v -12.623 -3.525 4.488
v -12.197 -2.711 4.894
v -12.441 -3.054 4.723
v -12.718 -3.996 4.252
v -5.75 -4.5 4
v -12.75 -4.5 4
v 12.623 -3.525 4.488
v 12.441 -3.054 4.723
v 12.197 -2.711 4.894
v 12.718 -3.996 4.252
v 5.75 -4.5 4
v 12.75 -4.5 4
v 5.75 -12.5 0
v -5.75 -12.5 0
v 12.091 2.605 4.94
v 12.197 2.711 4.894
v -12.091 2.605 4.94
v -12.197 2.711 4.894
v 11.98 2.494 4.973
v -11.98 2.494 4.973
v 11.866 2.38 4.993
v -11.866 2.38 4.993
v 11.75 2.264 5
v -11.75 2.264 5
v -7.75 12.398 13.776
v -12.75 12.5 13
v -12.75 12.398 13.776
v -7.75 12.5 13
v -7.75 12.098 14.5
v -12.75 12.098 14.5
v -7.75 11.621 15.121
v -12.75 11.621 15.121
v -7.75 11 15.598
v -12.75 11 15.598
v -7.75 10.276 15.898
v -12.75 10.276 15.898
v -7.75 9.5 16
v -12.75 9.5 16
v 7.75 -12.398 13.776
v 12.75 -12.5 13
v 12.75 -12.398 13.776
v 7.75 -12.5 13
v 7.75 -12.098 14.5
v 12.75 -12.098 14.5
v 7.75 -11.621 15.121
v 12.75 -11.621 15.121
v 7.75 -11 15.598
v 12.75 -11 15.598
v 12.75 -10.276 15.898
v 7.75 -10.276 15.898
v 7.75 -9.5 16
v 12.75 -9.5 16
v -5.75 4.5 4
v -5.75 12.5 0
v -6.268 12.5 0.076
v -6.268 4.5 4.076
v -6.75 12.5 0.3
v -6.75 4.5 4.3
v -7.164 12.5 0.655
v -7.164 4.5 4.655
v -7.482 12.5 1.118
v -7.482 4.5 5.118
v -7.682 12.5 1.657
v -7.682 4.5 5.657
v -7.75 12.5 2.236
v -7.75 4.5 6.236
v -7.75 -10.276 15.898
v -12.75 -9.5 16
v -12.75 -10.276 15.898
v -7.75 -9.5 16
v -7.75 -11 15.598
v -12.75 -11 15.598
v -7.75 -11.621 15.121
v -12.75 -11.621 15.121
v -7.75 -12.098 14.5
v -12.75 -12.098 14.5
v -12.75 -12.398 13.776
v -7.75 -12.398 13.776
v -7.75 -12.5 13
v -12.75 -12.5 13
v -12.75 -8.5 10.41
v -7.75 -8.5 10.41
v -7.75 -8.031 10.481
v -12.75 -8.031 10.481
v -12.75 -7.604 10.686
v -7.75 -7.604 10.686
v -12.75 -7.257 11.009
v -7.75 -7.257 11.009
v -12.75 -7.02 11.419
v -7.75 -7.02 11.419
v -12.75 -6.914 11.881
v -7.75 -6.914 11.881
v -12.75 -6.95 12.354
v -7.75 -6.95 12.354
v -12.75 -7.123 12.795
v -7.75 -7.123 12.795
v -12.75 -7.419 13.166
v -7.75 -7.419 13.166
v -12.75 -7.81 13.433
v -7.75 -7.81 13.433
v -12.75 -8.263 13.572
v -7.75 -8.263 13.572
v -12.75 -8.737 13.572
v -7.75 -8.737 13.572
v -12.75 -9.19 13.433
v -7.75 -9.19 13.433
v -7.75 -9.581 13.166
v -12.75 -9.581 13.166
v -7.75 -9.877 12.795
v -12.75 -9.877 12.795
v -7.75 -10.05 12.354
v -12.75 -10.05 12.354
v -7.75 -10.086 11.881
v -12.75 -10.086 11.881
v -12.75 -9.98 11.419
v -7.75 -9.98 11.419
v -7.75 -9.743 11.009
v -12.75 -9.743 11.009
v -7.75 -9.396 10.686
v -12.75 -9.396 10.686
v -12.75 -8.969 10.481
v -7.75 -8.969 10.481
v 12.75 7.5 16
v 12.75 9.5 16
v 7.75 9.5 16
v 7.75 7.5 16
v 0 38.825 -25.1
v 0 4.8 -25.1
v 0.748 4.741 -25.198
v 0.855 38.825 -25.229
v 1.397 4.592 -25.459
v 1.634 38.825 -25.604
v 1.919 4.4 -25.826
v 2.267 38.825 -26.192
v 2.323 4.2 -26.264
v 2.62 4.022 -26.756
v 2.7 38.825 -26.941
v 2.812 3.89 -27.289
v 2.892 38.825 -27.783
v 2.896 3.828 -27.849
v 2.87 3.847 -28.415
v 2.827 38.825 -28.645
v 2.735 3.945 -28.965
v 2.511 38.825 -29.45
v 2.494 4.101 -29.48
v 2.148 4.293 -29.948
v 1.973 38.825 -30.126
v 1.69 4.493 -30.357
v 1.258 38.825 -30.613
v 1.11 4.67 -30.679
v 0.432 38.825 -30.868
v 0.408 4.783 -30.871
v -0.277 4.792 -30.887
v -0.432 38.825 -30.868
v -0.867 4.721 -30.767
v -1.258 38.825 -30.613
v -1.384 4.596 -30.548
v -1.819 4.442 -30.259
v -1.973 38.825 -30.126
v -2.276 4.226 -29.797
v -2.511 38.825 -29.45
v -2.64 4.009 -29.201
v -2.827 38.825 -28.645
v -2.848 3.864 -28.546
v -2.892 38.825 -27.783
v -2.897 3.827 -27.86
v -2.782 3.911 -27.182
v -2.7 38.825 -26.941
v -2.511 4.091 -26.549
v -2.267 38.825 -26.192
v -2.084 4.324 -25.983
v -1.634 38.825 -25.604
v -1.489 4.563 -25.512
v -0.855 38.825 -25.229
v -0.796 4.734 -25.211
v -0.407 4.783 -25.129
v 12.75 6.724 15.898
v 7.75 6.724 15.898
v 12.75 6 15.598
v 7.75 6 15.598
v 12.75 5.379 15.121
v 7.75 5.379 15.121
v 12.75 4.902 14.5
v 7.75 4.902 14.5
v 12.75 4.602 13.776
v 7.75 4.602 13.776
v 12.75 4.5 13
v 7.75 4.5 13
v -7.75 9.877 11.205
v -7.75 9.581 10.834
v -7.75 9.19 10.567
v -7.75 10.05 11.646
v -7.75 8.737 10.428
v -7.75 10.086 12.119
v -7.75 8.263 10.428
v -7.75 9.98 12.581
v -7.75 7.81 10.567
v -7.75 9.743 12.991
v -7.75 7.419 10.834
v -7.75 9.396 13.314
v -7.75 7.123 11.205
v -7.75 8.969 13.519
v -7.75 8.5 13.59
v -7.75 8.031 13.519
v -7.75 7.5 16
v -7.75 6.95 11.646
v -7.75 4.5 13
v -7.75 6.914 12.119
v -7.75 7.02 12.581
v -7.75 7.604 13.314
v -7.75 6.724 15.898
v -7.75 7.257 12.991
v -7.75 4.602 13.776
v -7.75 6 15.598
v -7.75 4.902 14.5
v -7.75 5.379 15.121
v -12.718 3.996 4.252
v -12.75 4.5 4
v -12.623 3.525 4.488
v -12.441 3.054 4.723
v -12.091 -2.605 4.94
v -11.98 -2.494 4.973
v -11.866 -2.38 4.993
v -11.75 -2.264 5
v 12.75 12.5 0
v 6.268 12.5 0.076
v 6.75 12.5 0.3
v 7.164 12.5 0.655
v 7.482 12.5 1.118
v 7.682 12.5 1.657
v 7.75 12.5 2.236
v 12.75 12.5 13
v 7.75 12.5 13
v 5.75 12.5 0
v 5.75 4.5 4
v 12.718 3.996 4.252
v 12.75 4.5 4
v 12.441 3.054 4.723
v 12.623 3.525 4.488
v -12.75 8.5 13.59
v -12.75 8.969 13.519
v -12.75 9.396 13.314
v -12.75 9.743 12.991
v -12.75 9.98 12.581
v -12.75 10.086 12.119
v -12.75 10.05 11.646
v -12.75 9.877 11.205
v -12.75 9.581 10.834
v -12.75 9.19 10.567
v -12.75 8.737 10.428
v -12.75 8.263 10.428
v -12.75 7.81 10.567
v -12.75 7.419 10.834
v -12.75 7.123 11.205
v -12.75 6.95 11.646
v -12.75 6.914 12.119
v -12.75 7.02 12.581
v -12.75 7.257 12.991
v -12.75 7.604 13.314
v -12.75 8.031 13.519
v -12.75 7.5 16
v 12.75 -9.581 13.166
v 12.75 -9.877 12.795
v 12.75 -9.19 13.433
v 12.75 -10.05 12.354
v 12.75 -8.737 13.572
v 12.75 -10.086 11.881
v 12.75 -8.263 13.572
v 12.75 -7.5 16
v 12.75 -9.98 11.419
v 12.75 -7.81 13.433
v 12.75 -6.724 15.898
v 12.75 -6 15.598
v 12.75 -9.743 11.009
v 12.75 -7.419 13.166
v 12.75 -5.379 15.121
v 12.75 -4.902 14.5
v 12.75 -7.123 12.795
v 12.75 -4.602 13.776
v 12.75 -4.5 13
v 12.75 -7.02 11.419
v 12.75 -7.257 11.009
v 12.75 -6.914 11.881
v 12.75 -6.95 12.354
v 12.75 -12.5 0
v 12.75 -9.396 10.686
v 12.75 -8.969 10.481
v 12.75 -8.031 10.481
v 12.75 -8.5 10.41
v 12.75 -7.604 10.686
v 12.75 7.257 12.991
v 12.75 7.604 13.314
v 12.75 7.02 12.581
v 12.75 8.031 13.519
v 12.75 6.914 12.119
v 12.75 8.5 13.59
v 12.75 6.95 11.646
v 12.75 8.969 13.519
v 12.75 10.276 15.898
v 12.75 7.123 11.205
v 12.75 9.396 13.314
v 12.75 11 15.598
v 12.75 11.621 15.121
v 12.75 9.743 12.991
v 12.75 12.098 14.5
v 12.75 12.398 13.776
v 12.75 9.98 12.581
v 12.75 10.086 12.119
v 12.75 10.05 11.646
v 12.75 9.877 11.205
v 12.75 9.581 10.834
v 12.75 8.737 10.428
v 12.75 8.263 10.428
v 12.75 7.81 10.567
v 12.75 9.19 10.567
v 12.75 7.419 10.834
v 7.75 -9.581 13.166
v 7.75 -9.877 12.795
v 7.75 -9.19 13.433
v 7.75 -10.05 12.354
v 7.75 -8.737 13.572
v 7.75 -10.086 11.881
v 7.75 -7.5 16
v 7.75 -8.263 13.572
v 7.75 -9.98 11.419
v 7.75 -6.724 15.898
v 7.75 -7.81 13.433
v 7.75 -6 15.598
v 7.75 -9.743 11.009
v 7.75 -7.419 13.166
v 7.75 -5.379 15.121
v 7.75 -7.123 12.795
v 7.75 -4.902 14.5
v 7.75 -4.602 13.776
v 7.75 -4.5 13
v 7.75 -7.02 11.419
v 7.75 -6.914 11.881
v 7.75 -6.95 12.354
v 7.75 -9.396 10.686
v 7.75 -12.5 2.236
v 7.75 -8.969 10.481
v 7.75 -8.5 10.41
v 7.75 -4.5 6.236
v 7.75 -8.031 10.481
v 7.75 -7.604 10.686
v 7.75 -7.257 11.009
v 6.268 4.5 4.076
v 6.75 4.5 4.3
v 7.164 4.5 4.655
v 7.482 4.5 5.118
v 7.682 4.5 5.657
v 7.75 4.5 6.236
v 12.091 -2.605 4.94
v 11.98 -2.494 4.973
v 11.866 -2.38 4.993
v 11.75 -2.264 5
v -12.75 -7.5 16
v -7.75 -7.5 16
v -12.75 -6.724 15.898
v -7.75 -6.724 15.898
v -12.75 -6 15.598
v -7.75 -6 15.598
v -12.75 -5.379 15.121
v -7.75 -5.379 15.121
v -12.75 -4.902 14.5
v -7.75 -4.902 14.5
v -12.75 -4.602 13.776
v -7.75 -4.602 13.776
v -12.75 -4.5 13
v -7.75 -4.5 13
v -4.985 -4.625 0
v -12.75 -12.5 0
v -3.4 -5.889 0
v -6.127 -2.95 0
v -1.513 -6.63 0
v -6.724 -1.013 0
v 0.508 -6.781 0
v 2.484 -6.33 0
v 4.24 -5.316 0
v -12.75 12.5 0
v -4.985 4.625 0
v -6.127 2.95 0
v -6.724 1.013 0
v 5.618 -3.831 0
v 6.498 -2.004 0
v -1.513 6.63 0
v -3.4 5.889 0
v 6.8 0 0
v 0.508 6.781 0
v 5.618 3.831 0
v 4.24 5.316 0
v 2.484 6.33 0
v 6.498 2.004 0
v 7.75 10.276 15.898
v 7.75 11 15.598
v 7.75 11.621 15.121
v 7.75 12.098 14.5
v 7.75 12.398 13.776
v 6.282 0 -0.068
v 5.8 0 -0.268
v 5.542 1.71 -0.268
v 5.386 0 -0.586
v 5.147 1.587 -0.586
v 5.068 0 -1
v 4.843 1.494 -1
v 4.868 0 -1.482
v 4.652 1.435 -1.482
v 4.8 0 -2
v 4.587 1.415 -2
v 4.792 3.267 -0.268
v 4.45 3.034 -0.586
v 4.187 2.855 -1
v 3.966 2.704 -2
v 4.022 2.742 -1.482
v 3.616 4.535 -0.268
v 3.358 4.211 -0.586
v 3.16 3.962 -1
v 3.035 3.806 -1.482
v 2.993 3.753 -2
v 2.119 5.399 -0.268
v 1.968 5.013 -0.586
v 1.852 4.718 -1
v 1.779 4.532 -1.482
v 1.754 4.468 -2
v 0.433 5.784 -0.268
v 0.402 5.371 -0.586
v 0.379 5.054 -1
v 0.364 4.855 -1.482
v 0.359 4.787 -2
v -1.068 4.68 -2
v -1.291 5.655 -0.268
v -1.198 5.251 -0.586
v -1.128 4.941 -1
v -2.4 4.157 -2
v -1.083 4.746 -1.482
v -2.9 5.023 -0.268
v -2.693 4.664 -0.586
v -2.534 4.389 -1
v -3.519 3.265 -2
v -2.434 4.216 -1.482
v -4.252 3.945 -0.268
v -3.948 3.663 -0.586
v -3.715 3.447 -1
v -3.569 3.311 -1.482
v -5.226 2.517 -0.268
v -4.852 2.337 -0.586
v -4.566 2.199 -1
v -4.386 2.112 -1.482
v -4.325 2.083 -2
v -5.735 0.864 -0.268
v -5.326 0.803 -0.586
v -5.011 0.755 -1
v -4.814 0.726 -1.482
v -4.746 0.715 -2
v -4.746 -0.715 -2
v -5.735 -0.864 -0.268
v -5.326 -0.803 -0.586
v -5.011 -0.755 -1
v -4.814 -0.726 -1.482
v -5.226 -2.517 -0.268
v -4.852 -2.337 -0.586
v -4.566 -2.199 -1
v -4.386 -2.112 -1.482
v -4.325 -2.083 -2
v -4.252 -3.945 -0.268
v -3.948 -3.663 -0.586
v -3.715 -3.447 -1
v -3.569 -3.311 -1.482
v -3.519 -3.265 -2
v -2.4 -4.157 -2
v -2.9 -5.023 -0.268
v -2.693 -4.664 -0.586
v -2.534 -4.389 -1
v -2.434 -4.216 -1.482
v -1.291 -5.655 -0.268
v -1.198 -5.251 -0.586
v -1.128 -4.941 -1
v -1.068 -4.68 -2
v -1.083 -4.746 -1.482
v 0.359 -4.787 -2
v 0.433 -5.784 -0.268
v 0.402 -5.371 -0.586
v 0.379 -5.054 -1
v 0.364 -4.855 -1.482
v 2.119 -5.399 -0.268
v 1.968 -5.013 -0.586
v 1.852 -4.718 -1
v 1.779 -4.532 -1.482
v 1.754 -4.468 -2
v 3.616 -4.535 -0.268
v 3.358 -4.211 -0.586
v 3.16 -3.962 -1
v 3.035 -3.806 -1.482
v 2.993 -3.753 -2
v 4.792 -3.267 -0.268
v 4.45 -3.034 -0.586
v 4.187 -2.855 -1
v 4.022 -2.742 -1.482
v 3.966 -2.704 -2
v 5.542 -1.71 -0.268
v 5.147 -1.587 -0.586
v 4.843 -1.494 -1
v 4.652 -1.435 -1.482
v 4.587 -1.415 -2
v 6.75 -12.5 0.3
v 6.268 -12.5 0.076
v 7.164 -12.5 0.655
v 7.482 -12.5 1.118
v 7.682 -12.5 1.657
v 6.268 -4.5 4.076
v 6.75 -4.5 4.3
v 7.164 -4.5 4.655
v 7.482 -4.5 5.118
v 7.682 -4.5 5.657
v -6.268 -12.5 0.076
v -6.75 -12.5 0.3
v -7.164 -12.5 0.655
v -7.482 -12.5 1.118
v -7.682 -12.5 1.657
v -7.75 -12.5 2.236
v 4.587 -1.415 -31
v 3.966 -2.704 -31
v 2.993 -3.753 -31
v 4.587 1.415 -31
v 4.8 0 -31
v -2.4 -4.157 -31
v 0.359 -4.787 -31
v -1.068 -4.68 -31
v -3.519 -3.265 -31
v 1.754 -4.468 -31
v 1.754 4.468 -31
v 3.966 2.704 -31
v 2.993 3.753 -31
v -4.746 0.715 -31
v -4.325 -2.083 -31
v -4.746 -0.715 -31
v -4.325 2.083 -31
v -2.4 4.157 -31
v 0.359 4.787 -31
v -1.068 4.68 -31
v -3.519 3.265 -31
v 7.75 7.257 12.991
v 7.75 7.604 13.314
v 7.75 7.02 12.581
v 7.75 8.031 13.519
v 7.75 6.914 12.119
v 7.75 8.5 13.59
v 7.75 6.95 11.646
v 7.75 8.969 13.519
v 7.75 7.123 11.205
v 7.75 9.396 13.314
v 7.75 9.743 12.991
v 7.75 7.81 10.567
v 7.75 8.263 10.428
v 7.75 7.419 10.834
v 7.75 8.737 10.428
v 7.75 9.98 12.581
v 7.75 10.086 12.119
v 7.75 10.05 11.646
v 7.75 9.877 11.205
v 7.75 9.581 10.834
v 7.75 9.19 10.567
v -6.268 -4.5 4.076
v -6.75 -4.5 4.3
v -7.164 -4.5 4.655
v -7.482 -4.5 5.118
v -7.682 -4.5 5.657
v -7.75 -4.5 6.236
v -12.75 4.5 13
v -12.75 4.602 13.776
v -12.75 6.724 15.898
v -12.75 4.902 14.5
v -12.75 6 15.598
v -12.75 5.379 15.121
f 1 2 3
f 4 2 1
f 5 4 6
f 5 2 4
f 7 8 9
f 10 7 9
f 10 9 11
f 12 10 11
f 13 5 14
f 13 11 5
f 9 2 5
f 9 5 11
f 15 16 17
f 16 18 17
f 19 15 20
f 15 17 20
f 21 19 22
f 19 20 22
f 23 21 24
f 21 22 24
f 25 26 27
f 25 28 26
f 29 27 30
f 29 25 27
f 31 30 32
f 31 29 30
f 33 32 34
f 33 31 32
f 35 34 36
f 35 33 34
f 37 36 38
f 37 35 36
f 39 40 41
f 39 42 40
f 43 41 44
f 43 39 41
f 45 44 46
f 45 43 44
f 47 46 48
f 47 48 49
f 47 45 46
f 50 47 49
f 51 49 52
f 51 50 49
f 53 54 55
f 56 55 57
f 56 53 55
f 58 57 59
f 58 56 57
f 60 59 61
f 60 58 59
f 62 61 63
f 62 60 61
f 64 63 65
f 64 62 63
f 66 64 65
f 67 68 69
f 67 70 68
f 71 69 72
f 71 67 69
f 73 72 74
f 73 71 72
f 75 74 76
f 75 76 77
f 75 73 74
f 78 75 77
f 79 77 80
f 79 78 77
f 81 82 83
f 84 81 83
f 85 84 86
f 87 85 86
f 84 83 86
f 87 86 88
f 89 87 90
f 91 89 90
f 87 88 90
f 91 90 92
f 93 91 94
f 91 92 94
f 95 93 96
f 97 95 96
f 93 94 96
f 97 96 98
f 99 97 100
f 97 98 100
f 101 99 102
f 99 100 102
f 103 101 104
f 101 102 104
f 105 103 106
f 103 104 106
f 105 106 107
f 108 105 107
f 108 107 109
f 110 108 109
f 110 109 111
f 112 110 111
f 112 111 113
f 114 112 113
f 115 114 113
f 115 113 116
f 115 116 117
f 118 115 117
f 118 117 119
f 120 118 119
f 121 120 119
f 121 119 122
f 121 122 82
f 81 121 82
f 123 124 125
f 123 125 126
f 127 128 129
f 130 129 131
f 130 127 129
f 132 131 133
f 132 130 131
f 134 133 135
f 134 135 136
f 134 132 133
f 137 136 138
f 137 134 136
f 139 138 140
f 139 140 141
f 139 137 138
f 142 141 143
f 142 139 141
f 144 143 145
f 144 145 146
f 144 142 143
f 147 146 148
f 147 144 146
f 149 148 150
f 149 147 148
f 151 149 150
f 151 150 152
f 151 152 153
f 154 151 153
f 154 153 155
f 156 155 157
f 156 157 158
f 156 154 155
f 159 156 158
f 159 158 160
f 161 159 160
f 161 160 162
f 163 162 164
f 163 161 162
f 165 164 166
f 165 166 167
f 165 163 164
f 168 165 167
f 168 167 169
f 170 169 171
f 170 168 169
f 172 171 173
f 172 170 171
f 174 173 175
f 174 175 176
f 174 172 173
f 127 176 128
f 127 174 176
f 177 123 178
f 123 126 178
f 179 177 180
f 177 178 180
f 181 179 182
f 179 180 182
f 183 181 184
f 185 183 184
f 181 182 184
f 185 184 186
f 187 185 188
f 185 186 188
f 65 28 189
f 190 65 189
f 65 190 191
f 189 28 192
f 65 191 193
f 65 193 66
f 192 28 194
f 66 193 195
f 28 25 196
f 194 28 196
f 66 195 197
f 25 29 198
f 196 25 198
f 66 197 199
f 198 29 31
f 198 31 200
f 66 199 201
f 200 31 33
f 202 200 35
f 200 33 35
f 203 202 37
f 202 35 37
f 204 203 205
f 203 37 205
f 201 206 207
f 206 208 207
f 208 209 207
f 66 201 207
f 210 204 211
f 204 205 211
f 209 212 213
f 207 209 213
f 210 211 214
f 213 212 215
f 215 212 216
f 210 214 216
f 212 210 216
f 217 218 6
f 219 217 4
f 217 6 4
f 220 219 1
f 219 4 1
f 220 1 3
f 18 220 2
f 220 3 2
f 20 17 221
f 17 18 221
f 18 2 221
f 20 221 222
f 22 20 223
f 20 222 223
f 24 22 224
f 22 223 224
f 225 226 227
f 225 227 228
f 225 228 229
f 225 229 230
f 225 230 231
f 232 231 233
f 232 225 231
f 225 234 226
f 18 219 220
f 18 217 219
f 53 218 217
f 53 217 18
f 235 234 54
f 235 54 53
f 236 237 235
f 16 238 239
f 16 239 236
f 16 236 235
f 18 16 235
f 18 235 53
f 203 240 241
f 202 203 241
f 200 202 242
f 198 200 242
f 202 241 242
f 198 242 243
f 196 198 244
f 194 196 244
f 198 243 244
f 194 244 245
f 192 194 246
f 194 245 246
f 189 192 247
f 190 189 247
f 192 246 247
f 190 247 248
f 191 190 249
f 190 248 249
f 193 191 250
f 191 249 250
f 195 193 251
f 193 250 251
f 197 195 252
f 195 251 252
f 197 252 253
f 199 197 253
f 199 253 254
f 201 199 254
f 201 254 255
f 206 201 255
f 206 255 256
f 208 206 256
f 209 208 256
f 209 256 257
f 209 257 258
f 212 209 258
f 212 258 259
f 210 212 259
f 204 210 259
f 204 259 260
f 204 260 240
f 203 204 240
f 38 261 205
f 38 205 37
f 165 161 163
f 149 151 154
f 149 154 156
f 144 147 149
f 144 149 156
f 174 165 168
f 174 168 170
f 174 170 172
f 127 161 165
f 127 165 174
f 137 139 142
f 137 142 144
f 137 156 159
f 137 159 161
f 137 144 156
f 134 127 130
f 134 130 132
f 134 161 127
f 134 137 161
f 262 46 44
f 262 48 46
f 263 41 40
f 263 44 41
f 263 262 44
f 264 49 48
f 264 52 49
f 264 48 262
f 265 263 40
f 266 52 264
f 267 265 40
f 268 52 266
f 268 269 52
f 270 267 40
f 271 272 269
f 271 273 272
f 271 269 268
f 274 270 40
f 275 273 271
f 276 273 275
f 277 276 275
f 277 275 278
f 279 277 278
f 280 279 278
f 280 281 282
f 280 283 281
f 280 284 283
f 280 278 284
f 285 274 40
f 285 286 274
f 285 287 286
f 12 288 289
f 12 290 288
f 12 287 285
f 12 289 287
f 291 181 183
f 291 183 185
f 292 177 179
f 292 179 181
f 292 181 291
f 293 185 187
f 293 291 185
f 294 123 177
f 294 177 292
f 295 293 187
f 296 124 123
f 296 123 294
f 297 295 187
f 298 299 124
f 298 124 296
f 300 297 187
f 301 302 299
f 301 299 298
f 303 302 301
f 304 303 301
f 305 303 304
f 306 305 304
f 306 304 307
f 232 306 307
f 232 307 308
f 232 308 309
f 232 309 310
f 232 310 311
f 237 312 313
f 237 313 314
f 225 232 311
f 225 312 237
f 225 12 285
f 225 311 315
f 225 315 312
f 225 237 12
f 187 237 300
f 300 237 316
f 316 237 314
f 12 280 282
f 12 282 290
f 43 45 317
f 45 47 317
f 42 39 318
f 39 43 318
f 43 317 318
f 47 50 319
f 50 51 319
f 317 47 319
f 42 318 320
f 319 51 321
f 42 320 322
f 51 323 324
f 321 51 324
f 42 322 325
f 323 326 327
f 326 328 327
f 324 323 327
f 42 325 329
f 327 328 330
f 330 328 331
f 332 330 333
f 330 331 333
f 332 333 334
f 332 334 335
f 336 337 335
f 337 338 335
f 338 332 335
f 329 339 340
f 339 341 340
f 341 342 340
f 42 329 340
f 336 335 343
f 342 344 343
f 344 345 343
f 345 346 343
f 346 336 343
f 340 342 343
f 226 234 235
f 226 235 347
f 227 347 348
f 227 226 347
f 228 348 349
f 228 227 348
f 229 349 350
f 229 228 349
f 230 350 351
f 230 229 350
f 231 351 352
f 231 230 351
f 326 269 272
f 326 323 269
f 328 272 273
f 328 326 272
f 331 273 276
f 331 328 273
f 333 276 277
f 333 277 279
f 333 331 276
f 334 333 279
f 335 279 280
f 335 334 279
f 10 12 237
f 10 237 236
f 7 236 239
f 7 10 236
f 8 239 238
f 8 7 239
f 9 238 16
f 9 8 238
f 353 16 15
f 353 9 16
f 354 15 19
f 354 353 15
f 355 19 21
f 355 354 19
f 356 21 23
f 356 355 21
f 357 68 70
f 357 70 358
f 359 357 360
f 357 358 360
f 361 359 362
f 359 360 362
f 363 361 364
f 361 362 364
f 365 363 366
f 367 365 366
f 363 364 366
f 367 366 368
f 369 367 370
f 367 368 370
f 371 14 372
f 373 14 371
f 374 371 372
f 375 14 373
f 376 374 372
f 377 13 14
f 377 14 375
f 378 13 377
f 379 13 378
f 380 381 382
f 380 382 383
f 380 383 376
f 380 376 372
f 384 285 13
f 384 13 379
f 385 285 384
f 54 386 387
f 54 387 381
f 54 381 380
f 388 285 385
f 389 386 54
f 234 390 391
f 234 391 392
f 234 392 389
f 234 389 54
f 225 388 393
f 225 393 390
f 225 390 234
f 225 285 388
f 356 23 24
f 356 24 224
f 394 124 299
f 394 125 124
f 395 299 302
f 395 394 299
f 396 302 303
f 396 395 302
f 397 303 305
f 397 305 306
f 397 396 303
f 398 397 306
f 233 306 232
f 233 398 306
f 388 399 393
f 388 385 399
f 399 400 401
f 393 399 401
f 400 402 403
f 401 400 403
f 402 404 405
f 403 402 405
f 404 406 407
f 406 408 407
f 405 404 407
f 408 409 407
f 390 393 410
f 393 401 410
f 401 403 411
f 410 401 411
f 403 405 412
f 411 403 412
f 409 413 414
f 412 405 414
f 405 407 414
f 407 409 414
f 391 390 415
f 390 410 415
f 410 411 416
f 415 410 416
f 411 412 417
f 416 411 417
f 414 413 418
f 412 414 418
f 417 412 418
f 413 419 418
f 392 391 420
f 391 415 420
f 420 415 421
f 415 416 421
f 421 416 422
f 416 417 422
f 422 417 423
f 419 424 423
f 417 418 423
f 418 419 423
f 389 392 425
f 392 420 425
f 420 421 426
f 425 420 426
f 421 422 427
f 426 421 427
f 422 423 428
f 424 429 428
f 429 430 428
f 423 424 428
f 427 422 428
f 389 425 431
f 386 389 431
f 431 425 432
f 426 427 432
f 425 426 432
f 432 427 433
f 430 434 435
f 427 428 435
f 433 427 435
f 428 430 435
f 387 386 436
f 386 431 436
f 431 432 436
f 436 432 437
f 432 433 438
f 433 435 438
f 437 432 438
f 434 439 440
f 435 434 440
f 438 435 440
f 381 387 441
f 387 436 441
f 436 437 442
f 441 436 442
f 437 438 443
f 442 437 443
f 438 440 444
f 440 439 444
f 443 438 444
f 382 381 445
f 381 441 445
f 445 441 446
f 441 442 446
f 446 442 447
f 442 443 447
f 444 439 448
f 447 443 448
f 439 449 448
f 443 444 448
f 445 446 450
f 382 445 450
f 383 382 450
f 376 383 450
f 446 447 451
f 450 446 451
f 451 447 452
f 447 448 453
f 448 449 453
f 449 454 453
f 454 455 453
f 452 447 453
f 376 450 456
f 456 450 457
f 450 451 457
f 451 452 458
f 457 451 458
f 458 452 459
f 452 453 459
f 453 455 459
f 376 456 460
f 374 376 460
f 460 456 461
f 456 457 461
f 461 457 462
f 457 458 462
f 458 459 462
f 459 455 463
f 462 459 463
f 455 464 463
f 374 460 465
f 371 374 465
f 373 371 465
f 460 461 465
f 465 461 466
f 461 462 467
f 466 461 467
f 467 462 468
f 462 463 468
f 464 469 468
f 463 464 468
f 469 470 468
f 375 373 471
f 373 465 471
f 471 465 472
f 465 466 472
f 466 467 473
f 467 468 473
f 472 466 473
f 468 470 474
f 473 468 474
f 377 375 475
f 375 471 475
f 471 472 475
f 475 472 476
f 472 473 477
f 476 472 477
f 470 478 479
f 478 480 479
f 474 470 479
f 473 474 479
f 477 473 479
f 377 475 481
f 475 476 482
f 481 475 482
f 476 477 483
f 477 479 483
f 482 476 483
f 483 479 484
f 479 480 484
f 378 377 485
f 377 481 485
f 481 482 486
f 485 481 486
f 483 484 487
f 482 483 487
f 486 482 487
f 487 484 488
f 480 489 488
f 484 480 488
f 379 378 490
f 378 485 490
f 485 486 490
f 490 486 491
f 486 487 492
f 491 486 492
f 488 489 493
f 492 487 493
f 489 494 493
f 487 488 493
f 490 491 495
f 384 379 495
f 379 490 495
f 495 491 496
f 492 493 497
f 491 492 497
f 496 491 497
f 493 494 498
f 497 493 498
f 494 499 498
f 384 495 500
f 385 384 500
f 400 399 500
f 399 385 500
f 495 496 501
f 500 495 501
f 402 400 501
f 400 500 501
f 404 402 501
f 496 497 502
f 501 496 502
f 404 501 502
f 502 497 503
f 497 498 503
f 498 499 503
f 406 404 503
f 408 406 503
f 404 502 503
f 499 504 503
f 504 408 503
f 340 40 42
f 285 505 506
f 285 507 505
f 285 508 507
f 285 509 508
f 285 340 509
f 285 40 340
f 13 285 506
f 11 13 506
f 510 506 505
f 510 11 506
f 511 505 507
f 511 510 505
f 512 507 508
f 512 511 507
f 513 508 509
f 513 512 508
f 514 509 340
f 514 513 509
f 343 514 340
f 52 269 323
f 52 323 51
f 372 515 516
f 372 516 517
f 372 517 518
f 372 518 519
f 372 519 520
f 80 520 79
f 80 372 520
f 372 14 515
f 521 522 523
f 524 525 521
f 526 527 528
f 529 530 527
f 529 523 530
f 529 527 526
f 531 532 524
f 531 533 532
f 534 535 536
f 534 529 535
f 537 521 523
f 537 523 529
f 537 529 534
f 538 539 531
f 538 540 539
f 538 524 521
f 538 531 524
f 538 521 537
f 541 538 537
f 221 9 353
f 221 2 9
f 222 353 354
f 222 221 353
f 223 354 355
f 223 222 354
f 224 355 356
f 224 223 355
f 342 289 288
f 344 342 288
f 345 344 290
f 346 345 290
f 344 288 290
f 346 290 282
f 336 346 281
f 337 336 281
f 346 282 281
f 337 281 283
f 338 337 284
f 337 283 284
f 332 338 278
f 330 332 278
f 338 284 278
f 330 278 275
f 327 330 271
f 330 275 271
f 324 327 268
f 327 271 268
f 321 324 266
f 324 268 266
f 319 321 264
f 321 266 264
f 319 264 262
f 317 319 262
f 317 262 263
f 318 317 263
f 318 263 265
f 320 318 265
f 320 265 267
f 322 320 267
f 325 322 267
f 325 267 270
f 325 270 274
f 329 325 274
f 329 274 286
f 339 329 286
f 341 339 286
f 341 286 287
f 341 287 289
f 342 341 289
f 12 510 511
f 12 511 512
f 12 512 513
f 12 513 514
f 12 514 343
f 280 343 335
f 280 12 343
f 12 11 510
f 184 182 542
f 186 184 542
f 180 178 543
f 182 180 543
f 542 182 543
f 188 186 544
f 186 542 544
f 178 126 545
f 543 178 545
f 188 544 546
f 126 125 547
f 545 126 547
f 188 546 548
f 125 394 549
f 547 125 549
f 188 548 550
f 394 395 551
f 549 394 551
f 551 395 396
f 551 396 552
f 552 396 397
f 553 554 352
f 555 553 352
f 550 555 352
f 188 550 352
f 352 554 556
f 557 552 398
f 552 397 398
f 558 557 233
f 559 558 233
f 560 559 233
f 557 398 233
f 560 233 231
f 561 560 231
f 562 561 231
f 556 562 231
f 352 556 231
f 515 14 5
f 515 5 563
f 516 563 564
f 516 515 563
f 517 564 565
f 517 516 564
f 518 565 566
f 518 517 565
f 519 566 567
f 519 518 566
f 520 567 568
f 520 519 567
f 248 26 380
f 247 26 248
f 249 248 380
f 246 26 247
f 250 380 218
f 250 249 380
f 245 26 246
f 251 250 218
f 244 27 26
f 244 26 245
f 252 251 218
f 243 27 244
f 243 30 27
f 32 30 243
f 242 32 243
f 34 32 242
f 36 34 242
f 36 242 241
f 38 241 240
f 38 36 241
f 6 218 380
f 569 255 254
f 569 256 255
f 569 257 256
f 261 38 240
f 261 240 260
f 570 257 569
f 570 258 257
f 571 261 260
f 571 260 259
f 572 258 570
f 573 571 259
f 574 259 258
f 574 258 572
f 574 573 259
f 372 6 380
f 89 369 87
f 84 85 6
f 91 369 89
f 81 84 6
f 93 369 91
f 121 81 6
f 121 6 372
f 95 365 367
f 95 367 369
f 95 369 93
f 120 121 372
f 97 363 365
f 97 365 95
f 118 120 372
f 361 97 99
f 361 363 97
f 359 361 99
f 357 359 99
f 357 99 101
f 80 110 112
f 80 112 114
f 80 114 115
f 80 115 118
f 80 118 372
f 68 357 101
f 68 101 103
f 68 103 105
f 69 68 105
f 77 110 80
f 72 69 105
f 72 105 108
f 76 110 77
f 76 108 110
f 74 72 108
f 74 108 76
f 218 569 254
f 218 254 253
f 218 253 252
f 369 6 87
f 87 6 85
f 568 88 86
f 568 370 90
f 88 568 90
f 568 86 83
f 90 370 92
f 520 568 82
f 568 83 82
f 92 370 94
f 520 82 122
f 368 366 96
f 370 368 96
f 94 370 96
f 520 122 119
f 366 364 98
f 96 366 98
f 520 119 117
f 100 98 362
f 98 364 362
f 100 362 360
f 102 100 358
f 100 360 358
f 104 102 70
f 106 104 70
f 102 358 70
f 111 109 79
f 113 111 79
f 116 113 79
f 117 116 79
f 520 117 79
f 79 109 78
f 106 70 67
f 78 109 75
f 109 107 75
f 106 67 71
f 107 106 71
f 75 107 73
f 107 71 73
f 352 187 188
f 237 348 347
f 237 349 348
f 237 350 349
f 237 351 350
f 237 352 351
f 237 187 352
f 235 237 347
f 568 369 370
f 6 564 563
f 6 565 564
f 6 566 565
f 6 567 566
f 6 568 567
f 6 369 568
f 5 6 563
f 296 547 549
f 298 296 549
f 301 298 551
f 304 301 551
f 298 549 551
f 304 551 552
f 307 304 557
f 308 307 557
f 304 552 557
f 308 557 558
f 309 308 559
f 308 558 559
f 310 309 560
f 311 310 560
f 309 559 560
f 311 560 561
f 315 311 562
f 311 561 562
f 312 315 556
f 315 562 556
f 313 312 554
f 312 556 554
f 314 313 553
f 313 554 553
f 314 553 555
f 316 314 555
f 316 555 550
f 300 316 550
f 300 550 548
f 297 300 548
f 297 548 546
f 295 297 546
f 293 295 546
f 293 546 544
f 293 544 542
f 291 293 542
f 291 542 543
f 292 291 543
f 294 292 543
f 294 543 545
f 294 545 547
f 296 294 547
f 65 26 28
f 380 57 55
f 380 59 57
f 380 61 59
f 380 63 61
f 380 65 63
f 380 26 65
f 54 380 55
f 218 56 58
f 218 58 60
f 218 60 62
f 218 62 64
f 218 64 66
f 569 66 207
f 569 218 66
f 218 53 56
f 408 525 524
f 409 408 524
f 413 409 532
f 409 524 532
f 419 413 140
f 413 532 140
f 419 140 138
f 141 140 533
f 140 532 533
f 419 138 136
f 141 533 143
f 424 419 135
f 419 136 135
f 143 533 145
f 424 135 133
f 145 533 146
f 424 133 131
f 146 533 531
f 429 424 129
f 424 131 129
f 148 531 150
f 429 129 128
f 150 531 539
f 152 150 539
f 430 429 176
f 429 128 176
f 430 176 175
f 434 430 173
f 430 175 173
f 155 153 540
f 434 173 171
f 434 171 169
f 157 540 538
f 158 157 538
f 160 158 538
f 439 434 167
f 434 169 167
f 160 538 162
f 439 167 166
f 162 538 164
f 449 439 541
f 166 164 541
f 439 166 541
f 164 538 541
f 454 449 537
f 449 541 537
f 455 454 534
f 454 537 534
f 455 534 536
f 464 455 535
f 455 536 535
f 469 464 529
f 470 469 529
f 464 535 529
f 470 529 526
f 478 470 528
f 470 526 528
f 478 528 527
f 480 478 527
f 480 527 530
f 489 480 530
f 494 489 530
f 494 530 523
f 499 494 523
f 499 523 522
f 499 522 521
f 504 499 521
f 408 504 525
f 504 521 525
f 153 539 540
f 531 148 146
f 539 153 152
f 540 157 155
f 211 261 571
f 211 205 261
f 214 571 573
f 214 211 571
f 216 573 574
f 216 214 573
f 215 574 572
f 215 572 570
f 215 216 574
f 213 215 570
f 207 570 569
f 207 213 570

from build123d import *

# Parameters (mm, degrees)
BOSS_EXTRU_1_DEPTH = 25.5
BOSS_EXTRU_2_DEPTH = 5
BOSS_EXTRU_3_DEPTH = 5
BOSS_EXTRU_4_DEPTH = 5
BOSS_EXTRU_5_DEPTH = 5
ESQUISSE6_W        = 4.8
ESQUISSE6_H        = 31
ESQUISSE7_W        = 2.9
ESQUISSE7_H        = 35
PER_AGE1_D         = 3.18
PER_AGE1_DEPTH     = 5
PER_AGE2_D         = 3.18
PER_AGE3_D         = 3.18
PER_AGE3_DEPTH     = 5
PER_AGE4_D         = 3.18
CONG_1_R           = 1
CONG_2_R           = 2
CONG_3_R           = 3


with BuildPart() as part:
    # Esquisse1 → Boss.-Extru.1 (new body)
    with BuildSketch(Plane(origin=(12.75, 0, 0), x_dir=(0, 0, -1), z_dir=(1, 0, 0))):
        Polygon((-5, -2.5), (0, -12.5), (0, 12.5), (-5, 2.5), align=None)
    extrude(amount=-BOSS_EXTRU_1_DEPTH)

    # Esquisse2 → Boss.-Extru.2 (add)
    with BuildSketch(Plane(origin=(-12.75, 0, 0), x_dir=(0, -1, 0), z_dir=(-1, 0, 0))):
        Polygon((4.5, 16), (4.5, 4), (12.5, 0), (12.5, 16), align=None)
    extrude(amount=-BOSS_EXTRU_2_DEPTH)

    # Esquisse3 → Boss.-Extru.3 (add)
    with BuildSketch(Plane(origin=(12.75, 0, 0), x_dir=(0, 0, -1), z_dir=(1, 0, 0))):
        Polygon((-16, -12.5), (0, -12.5), (-4, -4.5), (-16, -4.5), align=None)
    extrude(amount=-BOSS_EXTRU_3_DEPTH)

    # Esquisse4 → Boss.-Extru.4 (add)
    with BuildSketch(Plane(origin=(12.75, 0, 0), x_dir=(0, 0, -1), z_dir=(1, 0, 0))):
        Polygon((-16, 4.5), (-4, 4.5), (0, 12.5), (-16, 12.5), align=None)
    extrude(amount=-BOSS_EXTRU_4_DEPTH)

    # Esquisse5 → Boss.-Extru.5 (add)
    with BuildSketch(Plane(origin=(-12.75, 0, 0), x_dir=(0, -1, 0), z_dir=(-1, 0, 0))):
        Polygon((-4.5, 16), (-12.5, 16), (-12.5, 0), (-4.5, 4), align=None)
    extrude(amount=-BOSS_EXTRU_5_DEPTH)

    # Esquisse6 → Révolution1 (revolve)
    with BuildSketch(Plane(origin=(0, 0, 0), x_dir=(1, 0, 0), z_dir=(0, 1, 0))):
        with Locations((2.4, 15.5)):
            Rectangle(ESQUISSE6_W, ESQUISSE6_H)
    revolve(axis=Axis((0, 0, -31), (0, 0, 1)))

    # Esquisse7 → Révolution2 (revolve)
    with BuildSketch(Plane(origin=(0.009791841, 0, -27.999996576), x_dir=(0.999999938851933, 0, 0.0003497086364192443), z_dir=(-0.0003497086364192443, 0, 0.999999938851933)), mode=Mode.PRIVATE) as r_volution2_sk:
        with Locations((-1.459791842, 21.3249183)):
            Rectangle(ESQUISSE7_W, ESQUISSE7_H)
    revolve(r_volution2_sk.sketch.rotate(Axis((0, 3.8249183, -28), (0, 1, 0)), 90.020036829), axis=Axis((0, 3.8249183, -28), (0, 1, 0)))

    # Perçage1
    with Locations(Plane.ZY.offset(12.75)):
        with Locations((12, -8.5)):
            Hole(PER_AGE1_D / 2, depth=PER_AGE1_DEPTH)

    # Perçage2 (through all)
    with Locations(Plane.ZY.offset(-7.75)):
        with Locations((12, -8.5)):
            Hole(PER_AGE2_D / 2)

    # Perçage3
    with Locations(Plane(origin=(12.75, 0, 0), x_dir=(0, 0, -1), z_dir=(1, 0, 0))):
        with Locations((-12, 8.5)):
            Hole(PER_AGE3_D / 2, depth=PER_AGE3_DEPTH)

    # Perçage4 (through all)
    with Locations(Plane(origin=(-7.75, 0, 0), x_dir=(0, 0, -1), z_dir=(1, 0, 0))):
        with Locations((-12, 8.5)):
            Hole(PER_AGE4_D / 2)

    # Congé1
    cong_1_edges = [part.edges().sort_by_distance(p)[0] for p in [
        (12.75, 0, 5),
        (-12.75, 0, 5),
        (0, -2.5, 5),
        (0, 2.5, 5),
    ]]
    fillet(cong_1_edges, radius=CONG_1_R - 0.0001)  # a hair under: the kernel refuses the full size

    # Congé2
    cong_2_edges = [part.edges().sort_by_distance(p)[0] for p in [
        (-7.75, -8.5, 2),
        (7.75, -8.5, 2),
        (7.75, 8.5, 2),
        (-7.75, 8.5, 2),
        (-4.8, 0, 0),
    ]]
    fillet(cong_2_edges, radius=CONG_2_R)

    # Congé3
    cong_3_edges = [part.edges().sort_by_distance(p)[0] for p in [
        (-10.25, -4.5, 16),
        (-10.25, -12.5, 16),
        (10.25, -12.5, 16),
        (10.25, -4.5, 16),
        (10.25, 4.5, 16),
        (10.25, 12.5, 16),
        (-10.25, 4.5, 16),
        (-10.25, 12.5, 16),
    ]]
    fillet(cong_3_edges, radius=CONG_3_R)


solid = part.part
